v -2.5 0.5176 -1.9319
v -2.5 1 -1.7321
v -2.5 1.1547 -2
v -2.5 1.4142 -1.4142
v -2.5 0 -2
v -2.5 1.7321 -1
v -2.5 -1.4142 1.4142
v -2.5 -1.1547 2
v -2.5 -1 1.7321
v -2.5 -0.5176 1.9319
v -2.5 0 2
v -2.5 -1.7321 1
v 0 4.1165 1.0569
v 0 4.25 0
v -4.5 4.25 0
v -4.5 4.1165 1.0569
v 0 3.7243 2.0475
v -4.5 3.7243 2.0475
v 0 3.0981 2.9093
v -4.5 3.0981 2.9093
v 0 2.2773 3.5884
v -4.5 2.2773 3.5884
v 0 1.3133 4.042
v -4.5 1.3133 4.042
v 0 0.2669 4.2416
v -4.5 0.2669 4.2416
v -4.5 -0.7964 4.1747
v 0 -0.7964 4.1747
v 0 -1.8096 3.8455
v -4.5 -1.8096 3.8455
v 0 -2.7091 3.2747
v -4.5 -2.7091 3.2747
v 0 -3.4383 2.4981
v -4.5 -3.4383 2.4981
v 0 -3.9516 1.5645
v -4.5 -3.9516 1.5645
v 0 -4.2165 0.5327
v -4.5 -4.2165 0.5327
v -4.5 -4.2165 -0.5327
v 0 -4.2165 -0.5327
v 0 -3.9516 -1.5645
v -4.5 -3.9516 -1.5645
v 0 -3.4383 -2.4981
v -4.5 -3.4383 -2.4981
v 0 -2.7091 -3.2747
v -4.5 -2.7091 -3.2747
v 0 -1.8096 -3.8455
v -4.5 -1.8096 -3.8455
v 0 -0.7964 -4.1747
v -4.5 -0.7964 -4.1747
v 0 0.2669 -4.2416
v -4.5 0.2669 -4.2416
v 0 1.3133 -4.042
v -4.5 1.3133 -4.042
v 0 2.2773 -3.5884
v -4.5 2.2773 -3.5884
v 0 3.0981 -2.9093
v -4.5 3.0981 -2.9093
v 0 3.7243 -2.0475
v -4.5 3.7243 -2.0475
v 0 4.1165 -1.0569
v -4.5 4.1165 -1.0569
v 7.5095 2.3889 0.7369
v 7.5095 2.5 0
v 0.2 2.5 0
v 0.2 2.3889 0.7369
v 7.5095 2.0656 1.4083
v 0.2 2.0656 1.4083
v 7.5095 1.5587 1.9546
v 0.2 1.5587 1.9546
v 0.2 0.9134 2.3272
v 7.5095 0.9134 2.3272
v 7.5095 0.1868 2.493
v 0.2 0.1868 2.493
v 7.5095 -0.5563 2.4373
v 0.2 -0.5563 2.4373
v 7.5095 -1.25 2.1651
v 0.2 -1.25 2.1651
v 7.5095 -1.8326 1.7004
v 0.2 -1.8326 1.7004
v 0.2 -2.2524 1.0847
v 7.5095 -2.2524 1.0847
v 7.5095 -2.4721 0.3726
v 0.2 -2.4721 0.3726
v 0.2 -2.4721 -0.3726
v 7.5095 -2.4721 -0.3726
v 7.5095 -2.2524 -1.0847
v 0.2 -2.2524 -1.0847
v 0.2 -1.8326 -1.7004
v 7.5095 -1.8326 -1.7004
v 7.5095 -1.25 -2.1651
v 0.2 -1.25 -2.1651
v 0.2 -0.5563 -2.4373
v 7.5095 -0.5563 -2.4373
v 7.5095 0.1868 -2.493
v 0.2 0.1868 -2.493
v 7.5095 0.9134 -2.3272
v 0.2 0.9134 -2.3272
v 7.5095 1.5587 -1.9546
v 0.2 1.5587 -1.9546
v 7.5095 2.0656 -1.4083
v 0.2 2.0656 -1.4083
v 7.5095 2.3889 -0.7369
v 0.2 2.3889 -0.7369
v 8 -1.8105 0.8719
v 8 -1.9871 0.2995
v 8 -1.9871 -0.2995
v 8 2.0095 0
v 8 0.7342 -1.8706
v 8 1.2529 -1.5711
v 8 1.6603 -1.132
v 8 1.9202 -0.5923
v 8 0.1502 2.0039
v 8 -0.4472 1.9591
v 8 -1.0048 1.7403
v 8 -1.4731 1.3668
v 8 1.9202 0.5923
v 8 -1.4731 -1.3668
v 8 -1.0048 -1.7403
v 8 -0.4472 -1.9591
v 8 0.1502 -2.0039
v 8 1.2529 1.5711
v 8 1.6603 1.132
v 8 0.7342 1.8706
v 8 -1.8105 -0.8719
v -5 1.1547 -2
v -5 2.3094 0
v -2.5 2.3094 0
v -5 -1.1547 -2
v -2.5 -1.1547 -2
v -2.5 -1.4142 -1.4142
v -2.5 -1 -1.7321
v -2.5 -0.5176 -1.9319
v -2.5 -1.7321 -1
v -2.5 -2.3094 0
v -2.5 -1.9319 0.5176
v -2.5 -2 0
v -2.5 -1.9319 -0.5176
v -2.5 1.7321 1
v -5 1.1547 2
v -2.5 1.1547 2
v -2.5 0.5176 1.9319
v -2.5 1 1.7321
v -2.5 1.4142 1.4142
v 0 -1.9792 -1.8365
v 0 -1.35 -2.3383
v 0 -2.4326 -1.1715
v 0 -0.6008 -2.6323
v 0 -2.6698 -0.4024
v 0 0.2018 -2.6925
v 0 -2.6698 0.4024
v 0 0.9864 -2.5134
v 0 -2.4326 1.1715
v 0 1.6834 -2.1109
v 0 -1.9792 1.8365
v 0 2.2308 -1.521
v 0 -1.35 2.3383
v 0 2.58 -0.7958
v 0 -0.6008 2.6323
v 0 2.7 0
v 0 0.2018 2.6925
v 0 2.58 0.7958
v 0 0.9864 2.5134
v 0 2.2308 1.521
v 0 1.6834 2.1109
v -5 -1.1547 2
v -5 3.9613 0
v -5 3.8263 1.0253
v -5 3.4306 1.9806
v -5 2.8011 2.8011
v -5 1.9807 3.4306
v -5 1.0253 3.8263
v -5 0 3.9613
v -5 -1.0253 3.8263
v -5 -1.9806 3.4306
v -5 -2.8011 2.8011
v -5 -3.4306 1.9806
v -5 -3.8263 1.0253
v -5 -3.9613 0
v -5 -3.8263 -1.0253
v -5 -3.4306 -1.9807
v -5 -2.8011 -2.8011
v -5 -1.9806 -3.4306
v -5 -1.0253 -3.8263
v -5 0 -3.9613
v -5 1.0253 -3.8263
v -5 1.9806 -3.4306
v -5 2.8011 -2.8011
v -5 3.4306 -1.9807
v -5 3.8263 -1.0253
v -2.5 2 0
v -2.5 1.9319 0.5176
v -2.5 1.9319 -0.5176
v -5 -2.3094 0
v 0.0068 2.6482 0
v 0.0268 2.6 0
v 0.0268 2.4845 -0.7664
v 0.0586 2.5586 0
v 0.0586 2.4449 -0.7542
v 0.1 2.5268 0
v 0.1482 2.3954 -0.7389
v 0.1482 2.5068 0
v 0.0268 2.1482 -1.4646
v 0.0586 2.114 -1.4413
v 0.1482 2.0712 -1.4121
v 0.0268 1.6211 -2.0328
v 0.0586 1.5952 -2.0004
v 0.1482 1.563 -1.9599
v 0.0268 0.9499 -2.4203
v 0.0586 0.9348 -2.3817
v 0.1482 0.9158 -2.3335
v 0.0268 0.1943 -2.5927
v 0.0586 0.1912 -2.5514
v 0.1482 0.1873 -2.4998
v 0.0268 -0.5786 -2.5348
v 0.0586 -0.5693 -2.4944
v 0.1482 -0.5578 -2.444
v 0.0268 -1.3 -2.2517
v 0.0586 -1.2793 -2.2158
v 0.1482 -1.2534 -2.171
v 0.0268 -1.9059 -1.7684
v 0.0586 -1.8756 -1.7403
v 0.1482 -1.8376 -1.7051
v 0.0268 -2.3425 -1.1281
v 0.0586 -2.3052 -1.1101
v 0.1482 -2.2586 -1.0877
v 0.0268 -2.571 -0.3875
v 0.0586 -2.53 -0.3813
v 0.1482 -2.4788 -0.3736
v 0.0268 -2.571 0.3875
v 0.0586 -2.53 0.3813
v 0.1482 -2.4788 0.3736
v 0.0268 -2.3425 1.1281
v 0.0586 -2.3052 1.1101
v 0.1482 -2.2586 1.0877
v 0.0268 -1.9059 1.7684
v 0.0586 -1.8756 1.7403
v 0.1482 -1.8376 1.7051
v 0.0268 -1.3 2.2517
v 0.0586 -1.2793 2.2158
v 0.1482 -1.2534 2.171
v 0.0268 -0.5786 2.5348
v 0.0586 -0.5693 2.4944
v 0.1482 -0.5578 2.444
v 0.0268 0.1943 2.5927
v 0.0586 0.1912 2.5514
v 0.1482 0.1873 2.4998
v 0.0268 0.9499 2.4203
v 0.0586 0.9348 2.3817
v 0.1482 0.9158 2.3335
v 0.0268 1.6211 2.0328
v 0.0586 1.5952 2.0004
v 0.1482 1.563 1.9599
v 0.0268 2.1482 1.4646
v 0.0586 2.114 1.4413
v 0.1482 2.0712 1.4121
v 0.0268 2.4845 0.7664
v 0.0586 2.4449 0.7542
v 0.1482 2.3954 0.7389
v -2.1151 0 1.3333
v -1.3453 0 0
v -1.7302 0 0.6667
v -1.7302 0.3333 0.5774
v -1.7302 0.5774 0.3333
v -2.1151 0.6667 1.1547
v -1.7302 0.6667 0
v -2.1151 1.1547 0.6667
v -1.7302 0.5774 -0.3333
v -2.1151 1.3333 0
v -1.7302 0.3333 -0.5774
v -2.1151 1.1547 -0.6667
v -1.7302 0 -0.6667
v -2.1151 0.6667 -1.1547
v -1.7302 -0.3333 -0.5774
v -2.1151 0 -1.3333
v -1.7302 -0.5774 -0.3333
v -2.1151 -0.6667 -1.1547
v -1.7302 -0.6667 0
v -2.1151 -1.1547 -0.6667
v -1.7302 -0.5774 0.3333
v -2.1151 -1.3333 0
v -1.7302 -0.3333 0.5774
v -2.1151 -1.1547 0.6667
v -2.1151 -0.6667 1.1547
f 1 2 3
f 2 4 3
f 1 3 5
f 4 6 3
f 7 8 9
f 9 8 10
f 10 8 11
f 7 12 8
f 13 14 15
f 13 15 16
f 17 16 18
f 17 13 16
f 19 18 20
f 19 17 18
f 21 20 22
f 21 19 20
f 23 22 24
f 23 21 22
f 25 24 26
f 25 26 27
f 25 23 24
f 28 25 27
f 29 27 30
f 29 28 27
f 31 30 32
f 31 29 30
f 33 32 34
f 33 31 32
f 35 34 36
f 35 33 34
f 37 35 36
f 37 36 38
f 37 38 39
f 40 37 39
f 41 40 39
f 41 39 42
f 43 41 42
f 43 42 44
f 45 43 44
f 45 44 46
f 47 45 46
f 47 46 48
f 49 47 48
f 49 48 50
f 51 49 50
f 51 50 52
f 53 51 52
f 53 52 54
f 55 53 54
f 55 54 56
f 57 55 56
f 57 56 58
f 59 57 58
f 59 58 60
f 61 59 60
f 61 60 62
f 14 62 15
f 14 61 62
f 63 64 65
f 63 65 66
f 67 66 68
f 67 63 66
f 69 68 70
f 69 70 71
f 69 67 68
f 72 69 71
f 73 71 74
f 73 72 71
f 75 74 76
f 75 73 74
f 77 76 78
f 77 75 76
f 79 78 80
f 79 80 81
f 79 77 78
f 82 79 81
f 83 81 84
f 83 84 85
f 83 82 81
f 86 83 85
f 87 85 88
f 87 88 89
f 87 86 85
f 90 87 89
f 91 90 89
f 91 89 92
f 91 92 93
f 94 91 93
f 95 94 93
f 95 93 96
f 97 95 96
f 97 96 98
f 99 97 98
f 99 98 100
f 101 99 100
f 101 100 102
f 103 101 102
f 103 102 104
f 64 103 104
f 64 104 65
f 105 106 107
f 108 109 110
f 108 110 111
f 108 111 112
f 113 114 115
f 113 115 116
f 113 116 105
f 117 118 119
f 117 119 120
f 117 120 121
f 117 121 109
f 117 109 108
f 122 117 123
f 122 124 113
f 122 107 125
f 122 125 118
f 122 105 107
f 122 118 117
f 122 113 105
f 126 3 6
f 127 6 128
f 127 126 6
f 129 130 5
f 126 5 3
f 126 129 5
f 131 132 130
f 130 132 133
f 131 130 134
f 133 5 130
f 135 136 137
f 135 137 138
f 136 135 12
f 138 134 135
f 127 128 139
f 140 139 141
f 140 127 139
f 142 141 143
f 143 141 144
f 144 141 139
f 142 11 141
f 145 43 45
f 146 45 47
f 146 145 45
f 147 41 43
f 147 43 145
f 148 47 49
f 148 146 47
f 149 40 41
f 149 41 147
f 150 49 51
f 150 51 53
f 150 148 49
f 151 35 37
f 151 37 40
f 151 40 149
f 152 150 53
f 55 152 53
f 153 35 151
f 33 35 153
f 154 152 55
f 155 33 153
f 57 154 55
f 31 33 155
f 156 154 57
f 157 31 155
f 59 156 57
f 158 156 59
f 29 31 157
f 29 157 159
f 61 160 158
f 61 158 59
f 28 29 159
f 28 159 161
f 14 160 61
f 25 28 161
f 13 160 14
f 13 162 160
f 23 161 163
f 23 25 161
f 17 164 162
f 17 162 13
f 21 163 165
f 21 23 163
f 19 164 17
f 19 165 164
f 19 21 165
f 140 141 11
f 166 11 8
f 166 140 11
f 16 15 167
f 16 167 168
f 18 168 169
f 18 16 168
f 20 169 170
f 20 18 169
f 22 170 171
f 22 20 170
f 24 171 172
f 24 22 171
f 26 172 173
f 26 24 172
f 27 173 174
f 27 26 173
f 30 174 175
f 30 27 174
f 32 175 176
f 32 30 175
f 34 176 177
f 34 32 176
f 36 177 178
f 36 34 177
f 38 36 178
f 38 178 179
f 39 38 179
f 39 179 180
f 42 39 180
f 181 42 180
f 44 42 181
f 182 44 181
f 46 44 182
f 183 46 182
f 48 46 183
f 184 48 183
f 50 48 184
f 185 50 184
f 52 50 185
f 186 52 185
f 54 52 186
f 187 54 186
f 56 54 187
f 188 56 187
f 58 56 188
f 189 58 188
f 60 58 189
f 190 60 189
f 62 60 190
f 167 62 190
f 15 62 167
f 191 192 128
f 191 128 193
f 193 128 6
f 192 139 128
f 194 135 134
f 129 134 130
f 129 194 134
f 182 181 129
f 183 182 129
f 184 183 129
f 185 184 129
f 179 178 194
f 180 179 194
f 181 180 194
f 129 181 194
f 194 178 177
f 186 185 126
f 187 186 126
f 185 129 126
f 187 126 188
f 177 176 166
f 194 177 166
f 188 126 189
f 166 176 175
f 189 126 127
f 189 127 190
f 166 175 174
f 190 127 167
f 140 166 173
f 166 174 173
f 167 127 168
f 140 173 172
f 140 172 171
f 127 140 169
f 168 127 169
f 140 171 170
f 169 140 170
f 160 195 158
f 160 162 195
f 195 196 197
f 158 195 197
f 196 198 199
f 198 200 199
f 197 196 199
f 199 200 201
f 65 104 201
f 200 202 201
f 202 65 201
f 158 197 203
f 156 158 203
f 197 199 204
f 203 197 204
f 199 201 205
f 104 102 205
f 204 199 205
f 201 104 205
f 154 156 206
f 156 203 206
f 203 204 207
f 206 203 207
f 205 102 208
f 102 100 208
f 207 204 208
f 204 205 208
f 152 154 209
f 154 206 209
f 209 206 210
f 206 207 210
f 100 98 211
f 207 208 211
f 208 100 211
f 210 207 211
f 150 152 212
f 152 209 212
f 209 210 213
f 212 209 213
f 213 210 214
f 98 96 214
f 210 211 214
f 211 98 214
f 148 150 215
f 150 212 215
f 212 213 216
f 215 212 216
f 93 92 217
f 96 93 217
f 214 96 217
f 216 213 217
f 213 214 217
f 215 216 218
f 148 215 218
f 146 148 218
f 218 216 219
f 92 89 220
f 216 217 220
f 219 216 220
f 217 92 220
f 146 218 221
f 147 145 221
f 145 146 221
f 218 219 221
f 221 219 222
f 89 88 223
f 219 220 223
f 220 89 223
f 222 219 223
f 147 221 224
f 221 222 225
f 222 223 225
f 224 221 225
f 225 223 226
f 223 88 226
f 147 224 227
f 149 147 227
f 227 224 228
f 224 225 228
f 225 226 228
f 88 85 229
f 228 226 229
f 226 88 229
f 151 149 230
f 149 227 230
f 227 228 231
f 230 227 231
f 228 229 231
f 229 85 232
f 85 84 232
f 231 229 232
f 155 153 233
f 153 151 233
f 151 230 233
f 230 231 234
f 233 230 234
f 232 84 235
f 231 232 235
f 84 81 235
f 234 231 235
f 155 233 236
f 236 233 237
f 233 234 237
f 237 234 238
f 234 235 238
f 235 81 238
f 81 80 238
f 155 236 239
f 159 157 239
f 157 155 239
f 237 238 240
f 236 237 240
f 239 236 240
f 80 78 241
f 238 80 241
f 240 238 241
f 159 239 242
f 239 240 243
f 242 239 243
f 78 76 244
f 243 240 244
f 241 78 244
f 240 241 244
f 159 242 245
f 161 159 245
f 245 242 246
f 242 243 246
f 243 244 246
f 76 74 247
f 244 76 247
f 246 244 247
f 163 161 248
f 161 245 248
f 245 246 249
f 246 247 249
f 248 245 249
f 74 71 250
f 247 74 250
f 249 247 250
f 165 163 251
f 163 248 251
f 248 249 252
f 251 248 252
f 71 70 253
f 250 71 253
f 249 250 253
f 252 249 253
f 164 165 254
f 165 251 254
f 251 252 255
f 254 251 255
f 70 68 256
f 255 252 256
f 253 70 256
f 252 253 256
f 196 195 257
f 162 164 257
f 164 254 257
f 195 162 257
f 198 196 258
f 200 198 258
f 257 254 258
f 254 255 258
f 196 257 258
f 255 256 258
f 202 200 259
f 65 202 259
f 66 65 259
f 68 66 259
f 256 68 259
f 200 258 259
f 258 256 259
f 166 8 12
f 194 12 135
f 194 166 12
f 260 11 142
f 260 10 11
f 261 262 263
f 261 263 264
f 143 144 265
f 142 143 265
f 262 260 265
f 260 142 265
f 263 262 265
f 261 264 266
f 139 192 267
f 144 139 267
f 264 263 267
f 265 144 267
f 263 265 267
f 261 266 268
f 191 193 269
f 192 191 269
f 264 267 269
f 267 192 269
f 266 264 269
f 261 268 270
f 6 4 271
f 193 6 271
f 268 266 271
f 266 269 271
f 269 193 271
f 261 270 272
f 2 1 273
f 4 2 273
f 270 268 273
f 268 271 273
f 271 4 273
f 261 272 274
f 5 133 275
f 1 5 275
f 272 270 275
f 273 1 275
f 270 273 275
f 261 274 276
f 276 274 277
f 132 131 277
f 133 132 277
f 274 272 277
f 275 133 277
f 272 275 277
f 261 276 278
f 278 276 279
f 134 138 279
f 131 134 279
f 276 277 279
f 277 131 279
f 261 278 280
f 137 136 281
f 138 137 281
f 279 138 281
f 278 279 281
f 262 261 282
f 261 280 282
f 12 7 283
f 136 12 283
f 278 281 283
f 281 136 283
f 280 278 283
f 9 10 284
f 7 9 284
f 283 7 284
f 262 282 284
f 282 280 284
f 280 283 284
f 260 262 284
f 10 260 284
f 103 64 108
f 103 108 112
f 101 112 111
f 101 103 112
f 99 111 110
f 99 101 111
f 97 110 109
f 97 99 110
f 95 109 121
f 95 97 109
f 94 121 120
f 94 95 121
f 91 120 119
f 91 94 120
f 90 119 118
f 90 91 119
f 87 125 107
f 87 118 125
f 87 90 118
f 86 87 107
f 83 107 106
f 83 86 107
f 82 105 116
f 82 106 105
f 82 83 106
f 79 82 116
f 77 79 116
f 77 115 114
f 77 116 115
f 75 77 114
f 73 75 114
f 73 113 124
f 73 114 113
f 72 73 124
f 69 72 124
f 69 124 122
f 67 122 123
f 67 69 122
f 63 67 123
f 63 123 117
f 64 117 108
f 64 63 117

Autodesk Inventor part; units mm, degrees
sketch "Sketch_8" plane through (0, 0, 0) normal (0, 0, 1) x (1, 0, 0)
  line L0 (8, 0) -> (-5, 0)
  line L1 (-5, 0) -> (-5, 3.9613)
  line L2 (-5, 3.9613) -> (-4.5, 4.25)
  line L3 (-4.5, 4.25) -> (0, 4.25)
  line L4 (0, 4.25) -> (0, 2.7)
  arc A0 (0, 2.7) -> (0.2, 2.5) centre (0.2, 2.7) ccw
  line L5 (0.2, 2.5) -> (7.5095, 2.5)
  line L6 (7.5095, 2.5) -> (8, 2.0095)
  line L7 (8, 2.0095) -> (8, 0)
  line L8 (8, 0) -> (-5, 0)
revolve "Revolution1" add sketch "Sketch_8" angle 360 about axis through (8, 0, 0) along (1, 0, 0)
thread "Thread1" size "M5x0.8" class "6g" standard "ISO Metric profile" full length
sketch "Sketch2" plane through (-5, 0, 0) normal (-1, 0, 0) x (0, 0, 1)
  point P0 (0, 0)
hole "Hole1" at (-5, 0, 0) direction (1, 0, 0) diameter 4 depth 2.5 tip angle 120
sketch "Sketch_3" plane through (-5, 0, 0) normal (1, 0, 0) x (0, 0, -1)
  line L0 (-2, -1.1547) -> (0, -2.3094)
  line L1 (0, -2.3094) -> (2, -1.1547)
  line L2 (2, -1.1547) -> (2, 1.1547)
  line L3 (2, 1.1547) -> (0, 2.3094)
  line L4 (0, 2.3094) -> (-2, 1.1547)
  line L5 (-2, 1.1547) -> (-2, -1.1547)
extrude "Extrusion1" cut sketch "Sketch_3" along normal blind 2.5
ref_plane "bolt_XY" through (0, 0, 0) normal (1, 0, 0) x (0, 0, -1)
ref_plane "bolt_YZ" through (0, 0, 0) normal (0, 0, -1) x (0, 1, 0)
ref_plane "bolt_ZX" through (0, 0, 0) normal (0, 1, 0) x (1, 0, 0)
ref_plane "nut_XY" through (8, 0, 0) normal (1, 0, 0) x (0, 0, -1)
ref_plane "nut_YZ" through (8, 0, 0) normal (0, 0, -1) x (0, 1, 0)
ref_plane "nut_ZX" through (8, 0, 0) normal (0, 1, 0) x (1, 0, 0)
properties part number "CBM5-8"
